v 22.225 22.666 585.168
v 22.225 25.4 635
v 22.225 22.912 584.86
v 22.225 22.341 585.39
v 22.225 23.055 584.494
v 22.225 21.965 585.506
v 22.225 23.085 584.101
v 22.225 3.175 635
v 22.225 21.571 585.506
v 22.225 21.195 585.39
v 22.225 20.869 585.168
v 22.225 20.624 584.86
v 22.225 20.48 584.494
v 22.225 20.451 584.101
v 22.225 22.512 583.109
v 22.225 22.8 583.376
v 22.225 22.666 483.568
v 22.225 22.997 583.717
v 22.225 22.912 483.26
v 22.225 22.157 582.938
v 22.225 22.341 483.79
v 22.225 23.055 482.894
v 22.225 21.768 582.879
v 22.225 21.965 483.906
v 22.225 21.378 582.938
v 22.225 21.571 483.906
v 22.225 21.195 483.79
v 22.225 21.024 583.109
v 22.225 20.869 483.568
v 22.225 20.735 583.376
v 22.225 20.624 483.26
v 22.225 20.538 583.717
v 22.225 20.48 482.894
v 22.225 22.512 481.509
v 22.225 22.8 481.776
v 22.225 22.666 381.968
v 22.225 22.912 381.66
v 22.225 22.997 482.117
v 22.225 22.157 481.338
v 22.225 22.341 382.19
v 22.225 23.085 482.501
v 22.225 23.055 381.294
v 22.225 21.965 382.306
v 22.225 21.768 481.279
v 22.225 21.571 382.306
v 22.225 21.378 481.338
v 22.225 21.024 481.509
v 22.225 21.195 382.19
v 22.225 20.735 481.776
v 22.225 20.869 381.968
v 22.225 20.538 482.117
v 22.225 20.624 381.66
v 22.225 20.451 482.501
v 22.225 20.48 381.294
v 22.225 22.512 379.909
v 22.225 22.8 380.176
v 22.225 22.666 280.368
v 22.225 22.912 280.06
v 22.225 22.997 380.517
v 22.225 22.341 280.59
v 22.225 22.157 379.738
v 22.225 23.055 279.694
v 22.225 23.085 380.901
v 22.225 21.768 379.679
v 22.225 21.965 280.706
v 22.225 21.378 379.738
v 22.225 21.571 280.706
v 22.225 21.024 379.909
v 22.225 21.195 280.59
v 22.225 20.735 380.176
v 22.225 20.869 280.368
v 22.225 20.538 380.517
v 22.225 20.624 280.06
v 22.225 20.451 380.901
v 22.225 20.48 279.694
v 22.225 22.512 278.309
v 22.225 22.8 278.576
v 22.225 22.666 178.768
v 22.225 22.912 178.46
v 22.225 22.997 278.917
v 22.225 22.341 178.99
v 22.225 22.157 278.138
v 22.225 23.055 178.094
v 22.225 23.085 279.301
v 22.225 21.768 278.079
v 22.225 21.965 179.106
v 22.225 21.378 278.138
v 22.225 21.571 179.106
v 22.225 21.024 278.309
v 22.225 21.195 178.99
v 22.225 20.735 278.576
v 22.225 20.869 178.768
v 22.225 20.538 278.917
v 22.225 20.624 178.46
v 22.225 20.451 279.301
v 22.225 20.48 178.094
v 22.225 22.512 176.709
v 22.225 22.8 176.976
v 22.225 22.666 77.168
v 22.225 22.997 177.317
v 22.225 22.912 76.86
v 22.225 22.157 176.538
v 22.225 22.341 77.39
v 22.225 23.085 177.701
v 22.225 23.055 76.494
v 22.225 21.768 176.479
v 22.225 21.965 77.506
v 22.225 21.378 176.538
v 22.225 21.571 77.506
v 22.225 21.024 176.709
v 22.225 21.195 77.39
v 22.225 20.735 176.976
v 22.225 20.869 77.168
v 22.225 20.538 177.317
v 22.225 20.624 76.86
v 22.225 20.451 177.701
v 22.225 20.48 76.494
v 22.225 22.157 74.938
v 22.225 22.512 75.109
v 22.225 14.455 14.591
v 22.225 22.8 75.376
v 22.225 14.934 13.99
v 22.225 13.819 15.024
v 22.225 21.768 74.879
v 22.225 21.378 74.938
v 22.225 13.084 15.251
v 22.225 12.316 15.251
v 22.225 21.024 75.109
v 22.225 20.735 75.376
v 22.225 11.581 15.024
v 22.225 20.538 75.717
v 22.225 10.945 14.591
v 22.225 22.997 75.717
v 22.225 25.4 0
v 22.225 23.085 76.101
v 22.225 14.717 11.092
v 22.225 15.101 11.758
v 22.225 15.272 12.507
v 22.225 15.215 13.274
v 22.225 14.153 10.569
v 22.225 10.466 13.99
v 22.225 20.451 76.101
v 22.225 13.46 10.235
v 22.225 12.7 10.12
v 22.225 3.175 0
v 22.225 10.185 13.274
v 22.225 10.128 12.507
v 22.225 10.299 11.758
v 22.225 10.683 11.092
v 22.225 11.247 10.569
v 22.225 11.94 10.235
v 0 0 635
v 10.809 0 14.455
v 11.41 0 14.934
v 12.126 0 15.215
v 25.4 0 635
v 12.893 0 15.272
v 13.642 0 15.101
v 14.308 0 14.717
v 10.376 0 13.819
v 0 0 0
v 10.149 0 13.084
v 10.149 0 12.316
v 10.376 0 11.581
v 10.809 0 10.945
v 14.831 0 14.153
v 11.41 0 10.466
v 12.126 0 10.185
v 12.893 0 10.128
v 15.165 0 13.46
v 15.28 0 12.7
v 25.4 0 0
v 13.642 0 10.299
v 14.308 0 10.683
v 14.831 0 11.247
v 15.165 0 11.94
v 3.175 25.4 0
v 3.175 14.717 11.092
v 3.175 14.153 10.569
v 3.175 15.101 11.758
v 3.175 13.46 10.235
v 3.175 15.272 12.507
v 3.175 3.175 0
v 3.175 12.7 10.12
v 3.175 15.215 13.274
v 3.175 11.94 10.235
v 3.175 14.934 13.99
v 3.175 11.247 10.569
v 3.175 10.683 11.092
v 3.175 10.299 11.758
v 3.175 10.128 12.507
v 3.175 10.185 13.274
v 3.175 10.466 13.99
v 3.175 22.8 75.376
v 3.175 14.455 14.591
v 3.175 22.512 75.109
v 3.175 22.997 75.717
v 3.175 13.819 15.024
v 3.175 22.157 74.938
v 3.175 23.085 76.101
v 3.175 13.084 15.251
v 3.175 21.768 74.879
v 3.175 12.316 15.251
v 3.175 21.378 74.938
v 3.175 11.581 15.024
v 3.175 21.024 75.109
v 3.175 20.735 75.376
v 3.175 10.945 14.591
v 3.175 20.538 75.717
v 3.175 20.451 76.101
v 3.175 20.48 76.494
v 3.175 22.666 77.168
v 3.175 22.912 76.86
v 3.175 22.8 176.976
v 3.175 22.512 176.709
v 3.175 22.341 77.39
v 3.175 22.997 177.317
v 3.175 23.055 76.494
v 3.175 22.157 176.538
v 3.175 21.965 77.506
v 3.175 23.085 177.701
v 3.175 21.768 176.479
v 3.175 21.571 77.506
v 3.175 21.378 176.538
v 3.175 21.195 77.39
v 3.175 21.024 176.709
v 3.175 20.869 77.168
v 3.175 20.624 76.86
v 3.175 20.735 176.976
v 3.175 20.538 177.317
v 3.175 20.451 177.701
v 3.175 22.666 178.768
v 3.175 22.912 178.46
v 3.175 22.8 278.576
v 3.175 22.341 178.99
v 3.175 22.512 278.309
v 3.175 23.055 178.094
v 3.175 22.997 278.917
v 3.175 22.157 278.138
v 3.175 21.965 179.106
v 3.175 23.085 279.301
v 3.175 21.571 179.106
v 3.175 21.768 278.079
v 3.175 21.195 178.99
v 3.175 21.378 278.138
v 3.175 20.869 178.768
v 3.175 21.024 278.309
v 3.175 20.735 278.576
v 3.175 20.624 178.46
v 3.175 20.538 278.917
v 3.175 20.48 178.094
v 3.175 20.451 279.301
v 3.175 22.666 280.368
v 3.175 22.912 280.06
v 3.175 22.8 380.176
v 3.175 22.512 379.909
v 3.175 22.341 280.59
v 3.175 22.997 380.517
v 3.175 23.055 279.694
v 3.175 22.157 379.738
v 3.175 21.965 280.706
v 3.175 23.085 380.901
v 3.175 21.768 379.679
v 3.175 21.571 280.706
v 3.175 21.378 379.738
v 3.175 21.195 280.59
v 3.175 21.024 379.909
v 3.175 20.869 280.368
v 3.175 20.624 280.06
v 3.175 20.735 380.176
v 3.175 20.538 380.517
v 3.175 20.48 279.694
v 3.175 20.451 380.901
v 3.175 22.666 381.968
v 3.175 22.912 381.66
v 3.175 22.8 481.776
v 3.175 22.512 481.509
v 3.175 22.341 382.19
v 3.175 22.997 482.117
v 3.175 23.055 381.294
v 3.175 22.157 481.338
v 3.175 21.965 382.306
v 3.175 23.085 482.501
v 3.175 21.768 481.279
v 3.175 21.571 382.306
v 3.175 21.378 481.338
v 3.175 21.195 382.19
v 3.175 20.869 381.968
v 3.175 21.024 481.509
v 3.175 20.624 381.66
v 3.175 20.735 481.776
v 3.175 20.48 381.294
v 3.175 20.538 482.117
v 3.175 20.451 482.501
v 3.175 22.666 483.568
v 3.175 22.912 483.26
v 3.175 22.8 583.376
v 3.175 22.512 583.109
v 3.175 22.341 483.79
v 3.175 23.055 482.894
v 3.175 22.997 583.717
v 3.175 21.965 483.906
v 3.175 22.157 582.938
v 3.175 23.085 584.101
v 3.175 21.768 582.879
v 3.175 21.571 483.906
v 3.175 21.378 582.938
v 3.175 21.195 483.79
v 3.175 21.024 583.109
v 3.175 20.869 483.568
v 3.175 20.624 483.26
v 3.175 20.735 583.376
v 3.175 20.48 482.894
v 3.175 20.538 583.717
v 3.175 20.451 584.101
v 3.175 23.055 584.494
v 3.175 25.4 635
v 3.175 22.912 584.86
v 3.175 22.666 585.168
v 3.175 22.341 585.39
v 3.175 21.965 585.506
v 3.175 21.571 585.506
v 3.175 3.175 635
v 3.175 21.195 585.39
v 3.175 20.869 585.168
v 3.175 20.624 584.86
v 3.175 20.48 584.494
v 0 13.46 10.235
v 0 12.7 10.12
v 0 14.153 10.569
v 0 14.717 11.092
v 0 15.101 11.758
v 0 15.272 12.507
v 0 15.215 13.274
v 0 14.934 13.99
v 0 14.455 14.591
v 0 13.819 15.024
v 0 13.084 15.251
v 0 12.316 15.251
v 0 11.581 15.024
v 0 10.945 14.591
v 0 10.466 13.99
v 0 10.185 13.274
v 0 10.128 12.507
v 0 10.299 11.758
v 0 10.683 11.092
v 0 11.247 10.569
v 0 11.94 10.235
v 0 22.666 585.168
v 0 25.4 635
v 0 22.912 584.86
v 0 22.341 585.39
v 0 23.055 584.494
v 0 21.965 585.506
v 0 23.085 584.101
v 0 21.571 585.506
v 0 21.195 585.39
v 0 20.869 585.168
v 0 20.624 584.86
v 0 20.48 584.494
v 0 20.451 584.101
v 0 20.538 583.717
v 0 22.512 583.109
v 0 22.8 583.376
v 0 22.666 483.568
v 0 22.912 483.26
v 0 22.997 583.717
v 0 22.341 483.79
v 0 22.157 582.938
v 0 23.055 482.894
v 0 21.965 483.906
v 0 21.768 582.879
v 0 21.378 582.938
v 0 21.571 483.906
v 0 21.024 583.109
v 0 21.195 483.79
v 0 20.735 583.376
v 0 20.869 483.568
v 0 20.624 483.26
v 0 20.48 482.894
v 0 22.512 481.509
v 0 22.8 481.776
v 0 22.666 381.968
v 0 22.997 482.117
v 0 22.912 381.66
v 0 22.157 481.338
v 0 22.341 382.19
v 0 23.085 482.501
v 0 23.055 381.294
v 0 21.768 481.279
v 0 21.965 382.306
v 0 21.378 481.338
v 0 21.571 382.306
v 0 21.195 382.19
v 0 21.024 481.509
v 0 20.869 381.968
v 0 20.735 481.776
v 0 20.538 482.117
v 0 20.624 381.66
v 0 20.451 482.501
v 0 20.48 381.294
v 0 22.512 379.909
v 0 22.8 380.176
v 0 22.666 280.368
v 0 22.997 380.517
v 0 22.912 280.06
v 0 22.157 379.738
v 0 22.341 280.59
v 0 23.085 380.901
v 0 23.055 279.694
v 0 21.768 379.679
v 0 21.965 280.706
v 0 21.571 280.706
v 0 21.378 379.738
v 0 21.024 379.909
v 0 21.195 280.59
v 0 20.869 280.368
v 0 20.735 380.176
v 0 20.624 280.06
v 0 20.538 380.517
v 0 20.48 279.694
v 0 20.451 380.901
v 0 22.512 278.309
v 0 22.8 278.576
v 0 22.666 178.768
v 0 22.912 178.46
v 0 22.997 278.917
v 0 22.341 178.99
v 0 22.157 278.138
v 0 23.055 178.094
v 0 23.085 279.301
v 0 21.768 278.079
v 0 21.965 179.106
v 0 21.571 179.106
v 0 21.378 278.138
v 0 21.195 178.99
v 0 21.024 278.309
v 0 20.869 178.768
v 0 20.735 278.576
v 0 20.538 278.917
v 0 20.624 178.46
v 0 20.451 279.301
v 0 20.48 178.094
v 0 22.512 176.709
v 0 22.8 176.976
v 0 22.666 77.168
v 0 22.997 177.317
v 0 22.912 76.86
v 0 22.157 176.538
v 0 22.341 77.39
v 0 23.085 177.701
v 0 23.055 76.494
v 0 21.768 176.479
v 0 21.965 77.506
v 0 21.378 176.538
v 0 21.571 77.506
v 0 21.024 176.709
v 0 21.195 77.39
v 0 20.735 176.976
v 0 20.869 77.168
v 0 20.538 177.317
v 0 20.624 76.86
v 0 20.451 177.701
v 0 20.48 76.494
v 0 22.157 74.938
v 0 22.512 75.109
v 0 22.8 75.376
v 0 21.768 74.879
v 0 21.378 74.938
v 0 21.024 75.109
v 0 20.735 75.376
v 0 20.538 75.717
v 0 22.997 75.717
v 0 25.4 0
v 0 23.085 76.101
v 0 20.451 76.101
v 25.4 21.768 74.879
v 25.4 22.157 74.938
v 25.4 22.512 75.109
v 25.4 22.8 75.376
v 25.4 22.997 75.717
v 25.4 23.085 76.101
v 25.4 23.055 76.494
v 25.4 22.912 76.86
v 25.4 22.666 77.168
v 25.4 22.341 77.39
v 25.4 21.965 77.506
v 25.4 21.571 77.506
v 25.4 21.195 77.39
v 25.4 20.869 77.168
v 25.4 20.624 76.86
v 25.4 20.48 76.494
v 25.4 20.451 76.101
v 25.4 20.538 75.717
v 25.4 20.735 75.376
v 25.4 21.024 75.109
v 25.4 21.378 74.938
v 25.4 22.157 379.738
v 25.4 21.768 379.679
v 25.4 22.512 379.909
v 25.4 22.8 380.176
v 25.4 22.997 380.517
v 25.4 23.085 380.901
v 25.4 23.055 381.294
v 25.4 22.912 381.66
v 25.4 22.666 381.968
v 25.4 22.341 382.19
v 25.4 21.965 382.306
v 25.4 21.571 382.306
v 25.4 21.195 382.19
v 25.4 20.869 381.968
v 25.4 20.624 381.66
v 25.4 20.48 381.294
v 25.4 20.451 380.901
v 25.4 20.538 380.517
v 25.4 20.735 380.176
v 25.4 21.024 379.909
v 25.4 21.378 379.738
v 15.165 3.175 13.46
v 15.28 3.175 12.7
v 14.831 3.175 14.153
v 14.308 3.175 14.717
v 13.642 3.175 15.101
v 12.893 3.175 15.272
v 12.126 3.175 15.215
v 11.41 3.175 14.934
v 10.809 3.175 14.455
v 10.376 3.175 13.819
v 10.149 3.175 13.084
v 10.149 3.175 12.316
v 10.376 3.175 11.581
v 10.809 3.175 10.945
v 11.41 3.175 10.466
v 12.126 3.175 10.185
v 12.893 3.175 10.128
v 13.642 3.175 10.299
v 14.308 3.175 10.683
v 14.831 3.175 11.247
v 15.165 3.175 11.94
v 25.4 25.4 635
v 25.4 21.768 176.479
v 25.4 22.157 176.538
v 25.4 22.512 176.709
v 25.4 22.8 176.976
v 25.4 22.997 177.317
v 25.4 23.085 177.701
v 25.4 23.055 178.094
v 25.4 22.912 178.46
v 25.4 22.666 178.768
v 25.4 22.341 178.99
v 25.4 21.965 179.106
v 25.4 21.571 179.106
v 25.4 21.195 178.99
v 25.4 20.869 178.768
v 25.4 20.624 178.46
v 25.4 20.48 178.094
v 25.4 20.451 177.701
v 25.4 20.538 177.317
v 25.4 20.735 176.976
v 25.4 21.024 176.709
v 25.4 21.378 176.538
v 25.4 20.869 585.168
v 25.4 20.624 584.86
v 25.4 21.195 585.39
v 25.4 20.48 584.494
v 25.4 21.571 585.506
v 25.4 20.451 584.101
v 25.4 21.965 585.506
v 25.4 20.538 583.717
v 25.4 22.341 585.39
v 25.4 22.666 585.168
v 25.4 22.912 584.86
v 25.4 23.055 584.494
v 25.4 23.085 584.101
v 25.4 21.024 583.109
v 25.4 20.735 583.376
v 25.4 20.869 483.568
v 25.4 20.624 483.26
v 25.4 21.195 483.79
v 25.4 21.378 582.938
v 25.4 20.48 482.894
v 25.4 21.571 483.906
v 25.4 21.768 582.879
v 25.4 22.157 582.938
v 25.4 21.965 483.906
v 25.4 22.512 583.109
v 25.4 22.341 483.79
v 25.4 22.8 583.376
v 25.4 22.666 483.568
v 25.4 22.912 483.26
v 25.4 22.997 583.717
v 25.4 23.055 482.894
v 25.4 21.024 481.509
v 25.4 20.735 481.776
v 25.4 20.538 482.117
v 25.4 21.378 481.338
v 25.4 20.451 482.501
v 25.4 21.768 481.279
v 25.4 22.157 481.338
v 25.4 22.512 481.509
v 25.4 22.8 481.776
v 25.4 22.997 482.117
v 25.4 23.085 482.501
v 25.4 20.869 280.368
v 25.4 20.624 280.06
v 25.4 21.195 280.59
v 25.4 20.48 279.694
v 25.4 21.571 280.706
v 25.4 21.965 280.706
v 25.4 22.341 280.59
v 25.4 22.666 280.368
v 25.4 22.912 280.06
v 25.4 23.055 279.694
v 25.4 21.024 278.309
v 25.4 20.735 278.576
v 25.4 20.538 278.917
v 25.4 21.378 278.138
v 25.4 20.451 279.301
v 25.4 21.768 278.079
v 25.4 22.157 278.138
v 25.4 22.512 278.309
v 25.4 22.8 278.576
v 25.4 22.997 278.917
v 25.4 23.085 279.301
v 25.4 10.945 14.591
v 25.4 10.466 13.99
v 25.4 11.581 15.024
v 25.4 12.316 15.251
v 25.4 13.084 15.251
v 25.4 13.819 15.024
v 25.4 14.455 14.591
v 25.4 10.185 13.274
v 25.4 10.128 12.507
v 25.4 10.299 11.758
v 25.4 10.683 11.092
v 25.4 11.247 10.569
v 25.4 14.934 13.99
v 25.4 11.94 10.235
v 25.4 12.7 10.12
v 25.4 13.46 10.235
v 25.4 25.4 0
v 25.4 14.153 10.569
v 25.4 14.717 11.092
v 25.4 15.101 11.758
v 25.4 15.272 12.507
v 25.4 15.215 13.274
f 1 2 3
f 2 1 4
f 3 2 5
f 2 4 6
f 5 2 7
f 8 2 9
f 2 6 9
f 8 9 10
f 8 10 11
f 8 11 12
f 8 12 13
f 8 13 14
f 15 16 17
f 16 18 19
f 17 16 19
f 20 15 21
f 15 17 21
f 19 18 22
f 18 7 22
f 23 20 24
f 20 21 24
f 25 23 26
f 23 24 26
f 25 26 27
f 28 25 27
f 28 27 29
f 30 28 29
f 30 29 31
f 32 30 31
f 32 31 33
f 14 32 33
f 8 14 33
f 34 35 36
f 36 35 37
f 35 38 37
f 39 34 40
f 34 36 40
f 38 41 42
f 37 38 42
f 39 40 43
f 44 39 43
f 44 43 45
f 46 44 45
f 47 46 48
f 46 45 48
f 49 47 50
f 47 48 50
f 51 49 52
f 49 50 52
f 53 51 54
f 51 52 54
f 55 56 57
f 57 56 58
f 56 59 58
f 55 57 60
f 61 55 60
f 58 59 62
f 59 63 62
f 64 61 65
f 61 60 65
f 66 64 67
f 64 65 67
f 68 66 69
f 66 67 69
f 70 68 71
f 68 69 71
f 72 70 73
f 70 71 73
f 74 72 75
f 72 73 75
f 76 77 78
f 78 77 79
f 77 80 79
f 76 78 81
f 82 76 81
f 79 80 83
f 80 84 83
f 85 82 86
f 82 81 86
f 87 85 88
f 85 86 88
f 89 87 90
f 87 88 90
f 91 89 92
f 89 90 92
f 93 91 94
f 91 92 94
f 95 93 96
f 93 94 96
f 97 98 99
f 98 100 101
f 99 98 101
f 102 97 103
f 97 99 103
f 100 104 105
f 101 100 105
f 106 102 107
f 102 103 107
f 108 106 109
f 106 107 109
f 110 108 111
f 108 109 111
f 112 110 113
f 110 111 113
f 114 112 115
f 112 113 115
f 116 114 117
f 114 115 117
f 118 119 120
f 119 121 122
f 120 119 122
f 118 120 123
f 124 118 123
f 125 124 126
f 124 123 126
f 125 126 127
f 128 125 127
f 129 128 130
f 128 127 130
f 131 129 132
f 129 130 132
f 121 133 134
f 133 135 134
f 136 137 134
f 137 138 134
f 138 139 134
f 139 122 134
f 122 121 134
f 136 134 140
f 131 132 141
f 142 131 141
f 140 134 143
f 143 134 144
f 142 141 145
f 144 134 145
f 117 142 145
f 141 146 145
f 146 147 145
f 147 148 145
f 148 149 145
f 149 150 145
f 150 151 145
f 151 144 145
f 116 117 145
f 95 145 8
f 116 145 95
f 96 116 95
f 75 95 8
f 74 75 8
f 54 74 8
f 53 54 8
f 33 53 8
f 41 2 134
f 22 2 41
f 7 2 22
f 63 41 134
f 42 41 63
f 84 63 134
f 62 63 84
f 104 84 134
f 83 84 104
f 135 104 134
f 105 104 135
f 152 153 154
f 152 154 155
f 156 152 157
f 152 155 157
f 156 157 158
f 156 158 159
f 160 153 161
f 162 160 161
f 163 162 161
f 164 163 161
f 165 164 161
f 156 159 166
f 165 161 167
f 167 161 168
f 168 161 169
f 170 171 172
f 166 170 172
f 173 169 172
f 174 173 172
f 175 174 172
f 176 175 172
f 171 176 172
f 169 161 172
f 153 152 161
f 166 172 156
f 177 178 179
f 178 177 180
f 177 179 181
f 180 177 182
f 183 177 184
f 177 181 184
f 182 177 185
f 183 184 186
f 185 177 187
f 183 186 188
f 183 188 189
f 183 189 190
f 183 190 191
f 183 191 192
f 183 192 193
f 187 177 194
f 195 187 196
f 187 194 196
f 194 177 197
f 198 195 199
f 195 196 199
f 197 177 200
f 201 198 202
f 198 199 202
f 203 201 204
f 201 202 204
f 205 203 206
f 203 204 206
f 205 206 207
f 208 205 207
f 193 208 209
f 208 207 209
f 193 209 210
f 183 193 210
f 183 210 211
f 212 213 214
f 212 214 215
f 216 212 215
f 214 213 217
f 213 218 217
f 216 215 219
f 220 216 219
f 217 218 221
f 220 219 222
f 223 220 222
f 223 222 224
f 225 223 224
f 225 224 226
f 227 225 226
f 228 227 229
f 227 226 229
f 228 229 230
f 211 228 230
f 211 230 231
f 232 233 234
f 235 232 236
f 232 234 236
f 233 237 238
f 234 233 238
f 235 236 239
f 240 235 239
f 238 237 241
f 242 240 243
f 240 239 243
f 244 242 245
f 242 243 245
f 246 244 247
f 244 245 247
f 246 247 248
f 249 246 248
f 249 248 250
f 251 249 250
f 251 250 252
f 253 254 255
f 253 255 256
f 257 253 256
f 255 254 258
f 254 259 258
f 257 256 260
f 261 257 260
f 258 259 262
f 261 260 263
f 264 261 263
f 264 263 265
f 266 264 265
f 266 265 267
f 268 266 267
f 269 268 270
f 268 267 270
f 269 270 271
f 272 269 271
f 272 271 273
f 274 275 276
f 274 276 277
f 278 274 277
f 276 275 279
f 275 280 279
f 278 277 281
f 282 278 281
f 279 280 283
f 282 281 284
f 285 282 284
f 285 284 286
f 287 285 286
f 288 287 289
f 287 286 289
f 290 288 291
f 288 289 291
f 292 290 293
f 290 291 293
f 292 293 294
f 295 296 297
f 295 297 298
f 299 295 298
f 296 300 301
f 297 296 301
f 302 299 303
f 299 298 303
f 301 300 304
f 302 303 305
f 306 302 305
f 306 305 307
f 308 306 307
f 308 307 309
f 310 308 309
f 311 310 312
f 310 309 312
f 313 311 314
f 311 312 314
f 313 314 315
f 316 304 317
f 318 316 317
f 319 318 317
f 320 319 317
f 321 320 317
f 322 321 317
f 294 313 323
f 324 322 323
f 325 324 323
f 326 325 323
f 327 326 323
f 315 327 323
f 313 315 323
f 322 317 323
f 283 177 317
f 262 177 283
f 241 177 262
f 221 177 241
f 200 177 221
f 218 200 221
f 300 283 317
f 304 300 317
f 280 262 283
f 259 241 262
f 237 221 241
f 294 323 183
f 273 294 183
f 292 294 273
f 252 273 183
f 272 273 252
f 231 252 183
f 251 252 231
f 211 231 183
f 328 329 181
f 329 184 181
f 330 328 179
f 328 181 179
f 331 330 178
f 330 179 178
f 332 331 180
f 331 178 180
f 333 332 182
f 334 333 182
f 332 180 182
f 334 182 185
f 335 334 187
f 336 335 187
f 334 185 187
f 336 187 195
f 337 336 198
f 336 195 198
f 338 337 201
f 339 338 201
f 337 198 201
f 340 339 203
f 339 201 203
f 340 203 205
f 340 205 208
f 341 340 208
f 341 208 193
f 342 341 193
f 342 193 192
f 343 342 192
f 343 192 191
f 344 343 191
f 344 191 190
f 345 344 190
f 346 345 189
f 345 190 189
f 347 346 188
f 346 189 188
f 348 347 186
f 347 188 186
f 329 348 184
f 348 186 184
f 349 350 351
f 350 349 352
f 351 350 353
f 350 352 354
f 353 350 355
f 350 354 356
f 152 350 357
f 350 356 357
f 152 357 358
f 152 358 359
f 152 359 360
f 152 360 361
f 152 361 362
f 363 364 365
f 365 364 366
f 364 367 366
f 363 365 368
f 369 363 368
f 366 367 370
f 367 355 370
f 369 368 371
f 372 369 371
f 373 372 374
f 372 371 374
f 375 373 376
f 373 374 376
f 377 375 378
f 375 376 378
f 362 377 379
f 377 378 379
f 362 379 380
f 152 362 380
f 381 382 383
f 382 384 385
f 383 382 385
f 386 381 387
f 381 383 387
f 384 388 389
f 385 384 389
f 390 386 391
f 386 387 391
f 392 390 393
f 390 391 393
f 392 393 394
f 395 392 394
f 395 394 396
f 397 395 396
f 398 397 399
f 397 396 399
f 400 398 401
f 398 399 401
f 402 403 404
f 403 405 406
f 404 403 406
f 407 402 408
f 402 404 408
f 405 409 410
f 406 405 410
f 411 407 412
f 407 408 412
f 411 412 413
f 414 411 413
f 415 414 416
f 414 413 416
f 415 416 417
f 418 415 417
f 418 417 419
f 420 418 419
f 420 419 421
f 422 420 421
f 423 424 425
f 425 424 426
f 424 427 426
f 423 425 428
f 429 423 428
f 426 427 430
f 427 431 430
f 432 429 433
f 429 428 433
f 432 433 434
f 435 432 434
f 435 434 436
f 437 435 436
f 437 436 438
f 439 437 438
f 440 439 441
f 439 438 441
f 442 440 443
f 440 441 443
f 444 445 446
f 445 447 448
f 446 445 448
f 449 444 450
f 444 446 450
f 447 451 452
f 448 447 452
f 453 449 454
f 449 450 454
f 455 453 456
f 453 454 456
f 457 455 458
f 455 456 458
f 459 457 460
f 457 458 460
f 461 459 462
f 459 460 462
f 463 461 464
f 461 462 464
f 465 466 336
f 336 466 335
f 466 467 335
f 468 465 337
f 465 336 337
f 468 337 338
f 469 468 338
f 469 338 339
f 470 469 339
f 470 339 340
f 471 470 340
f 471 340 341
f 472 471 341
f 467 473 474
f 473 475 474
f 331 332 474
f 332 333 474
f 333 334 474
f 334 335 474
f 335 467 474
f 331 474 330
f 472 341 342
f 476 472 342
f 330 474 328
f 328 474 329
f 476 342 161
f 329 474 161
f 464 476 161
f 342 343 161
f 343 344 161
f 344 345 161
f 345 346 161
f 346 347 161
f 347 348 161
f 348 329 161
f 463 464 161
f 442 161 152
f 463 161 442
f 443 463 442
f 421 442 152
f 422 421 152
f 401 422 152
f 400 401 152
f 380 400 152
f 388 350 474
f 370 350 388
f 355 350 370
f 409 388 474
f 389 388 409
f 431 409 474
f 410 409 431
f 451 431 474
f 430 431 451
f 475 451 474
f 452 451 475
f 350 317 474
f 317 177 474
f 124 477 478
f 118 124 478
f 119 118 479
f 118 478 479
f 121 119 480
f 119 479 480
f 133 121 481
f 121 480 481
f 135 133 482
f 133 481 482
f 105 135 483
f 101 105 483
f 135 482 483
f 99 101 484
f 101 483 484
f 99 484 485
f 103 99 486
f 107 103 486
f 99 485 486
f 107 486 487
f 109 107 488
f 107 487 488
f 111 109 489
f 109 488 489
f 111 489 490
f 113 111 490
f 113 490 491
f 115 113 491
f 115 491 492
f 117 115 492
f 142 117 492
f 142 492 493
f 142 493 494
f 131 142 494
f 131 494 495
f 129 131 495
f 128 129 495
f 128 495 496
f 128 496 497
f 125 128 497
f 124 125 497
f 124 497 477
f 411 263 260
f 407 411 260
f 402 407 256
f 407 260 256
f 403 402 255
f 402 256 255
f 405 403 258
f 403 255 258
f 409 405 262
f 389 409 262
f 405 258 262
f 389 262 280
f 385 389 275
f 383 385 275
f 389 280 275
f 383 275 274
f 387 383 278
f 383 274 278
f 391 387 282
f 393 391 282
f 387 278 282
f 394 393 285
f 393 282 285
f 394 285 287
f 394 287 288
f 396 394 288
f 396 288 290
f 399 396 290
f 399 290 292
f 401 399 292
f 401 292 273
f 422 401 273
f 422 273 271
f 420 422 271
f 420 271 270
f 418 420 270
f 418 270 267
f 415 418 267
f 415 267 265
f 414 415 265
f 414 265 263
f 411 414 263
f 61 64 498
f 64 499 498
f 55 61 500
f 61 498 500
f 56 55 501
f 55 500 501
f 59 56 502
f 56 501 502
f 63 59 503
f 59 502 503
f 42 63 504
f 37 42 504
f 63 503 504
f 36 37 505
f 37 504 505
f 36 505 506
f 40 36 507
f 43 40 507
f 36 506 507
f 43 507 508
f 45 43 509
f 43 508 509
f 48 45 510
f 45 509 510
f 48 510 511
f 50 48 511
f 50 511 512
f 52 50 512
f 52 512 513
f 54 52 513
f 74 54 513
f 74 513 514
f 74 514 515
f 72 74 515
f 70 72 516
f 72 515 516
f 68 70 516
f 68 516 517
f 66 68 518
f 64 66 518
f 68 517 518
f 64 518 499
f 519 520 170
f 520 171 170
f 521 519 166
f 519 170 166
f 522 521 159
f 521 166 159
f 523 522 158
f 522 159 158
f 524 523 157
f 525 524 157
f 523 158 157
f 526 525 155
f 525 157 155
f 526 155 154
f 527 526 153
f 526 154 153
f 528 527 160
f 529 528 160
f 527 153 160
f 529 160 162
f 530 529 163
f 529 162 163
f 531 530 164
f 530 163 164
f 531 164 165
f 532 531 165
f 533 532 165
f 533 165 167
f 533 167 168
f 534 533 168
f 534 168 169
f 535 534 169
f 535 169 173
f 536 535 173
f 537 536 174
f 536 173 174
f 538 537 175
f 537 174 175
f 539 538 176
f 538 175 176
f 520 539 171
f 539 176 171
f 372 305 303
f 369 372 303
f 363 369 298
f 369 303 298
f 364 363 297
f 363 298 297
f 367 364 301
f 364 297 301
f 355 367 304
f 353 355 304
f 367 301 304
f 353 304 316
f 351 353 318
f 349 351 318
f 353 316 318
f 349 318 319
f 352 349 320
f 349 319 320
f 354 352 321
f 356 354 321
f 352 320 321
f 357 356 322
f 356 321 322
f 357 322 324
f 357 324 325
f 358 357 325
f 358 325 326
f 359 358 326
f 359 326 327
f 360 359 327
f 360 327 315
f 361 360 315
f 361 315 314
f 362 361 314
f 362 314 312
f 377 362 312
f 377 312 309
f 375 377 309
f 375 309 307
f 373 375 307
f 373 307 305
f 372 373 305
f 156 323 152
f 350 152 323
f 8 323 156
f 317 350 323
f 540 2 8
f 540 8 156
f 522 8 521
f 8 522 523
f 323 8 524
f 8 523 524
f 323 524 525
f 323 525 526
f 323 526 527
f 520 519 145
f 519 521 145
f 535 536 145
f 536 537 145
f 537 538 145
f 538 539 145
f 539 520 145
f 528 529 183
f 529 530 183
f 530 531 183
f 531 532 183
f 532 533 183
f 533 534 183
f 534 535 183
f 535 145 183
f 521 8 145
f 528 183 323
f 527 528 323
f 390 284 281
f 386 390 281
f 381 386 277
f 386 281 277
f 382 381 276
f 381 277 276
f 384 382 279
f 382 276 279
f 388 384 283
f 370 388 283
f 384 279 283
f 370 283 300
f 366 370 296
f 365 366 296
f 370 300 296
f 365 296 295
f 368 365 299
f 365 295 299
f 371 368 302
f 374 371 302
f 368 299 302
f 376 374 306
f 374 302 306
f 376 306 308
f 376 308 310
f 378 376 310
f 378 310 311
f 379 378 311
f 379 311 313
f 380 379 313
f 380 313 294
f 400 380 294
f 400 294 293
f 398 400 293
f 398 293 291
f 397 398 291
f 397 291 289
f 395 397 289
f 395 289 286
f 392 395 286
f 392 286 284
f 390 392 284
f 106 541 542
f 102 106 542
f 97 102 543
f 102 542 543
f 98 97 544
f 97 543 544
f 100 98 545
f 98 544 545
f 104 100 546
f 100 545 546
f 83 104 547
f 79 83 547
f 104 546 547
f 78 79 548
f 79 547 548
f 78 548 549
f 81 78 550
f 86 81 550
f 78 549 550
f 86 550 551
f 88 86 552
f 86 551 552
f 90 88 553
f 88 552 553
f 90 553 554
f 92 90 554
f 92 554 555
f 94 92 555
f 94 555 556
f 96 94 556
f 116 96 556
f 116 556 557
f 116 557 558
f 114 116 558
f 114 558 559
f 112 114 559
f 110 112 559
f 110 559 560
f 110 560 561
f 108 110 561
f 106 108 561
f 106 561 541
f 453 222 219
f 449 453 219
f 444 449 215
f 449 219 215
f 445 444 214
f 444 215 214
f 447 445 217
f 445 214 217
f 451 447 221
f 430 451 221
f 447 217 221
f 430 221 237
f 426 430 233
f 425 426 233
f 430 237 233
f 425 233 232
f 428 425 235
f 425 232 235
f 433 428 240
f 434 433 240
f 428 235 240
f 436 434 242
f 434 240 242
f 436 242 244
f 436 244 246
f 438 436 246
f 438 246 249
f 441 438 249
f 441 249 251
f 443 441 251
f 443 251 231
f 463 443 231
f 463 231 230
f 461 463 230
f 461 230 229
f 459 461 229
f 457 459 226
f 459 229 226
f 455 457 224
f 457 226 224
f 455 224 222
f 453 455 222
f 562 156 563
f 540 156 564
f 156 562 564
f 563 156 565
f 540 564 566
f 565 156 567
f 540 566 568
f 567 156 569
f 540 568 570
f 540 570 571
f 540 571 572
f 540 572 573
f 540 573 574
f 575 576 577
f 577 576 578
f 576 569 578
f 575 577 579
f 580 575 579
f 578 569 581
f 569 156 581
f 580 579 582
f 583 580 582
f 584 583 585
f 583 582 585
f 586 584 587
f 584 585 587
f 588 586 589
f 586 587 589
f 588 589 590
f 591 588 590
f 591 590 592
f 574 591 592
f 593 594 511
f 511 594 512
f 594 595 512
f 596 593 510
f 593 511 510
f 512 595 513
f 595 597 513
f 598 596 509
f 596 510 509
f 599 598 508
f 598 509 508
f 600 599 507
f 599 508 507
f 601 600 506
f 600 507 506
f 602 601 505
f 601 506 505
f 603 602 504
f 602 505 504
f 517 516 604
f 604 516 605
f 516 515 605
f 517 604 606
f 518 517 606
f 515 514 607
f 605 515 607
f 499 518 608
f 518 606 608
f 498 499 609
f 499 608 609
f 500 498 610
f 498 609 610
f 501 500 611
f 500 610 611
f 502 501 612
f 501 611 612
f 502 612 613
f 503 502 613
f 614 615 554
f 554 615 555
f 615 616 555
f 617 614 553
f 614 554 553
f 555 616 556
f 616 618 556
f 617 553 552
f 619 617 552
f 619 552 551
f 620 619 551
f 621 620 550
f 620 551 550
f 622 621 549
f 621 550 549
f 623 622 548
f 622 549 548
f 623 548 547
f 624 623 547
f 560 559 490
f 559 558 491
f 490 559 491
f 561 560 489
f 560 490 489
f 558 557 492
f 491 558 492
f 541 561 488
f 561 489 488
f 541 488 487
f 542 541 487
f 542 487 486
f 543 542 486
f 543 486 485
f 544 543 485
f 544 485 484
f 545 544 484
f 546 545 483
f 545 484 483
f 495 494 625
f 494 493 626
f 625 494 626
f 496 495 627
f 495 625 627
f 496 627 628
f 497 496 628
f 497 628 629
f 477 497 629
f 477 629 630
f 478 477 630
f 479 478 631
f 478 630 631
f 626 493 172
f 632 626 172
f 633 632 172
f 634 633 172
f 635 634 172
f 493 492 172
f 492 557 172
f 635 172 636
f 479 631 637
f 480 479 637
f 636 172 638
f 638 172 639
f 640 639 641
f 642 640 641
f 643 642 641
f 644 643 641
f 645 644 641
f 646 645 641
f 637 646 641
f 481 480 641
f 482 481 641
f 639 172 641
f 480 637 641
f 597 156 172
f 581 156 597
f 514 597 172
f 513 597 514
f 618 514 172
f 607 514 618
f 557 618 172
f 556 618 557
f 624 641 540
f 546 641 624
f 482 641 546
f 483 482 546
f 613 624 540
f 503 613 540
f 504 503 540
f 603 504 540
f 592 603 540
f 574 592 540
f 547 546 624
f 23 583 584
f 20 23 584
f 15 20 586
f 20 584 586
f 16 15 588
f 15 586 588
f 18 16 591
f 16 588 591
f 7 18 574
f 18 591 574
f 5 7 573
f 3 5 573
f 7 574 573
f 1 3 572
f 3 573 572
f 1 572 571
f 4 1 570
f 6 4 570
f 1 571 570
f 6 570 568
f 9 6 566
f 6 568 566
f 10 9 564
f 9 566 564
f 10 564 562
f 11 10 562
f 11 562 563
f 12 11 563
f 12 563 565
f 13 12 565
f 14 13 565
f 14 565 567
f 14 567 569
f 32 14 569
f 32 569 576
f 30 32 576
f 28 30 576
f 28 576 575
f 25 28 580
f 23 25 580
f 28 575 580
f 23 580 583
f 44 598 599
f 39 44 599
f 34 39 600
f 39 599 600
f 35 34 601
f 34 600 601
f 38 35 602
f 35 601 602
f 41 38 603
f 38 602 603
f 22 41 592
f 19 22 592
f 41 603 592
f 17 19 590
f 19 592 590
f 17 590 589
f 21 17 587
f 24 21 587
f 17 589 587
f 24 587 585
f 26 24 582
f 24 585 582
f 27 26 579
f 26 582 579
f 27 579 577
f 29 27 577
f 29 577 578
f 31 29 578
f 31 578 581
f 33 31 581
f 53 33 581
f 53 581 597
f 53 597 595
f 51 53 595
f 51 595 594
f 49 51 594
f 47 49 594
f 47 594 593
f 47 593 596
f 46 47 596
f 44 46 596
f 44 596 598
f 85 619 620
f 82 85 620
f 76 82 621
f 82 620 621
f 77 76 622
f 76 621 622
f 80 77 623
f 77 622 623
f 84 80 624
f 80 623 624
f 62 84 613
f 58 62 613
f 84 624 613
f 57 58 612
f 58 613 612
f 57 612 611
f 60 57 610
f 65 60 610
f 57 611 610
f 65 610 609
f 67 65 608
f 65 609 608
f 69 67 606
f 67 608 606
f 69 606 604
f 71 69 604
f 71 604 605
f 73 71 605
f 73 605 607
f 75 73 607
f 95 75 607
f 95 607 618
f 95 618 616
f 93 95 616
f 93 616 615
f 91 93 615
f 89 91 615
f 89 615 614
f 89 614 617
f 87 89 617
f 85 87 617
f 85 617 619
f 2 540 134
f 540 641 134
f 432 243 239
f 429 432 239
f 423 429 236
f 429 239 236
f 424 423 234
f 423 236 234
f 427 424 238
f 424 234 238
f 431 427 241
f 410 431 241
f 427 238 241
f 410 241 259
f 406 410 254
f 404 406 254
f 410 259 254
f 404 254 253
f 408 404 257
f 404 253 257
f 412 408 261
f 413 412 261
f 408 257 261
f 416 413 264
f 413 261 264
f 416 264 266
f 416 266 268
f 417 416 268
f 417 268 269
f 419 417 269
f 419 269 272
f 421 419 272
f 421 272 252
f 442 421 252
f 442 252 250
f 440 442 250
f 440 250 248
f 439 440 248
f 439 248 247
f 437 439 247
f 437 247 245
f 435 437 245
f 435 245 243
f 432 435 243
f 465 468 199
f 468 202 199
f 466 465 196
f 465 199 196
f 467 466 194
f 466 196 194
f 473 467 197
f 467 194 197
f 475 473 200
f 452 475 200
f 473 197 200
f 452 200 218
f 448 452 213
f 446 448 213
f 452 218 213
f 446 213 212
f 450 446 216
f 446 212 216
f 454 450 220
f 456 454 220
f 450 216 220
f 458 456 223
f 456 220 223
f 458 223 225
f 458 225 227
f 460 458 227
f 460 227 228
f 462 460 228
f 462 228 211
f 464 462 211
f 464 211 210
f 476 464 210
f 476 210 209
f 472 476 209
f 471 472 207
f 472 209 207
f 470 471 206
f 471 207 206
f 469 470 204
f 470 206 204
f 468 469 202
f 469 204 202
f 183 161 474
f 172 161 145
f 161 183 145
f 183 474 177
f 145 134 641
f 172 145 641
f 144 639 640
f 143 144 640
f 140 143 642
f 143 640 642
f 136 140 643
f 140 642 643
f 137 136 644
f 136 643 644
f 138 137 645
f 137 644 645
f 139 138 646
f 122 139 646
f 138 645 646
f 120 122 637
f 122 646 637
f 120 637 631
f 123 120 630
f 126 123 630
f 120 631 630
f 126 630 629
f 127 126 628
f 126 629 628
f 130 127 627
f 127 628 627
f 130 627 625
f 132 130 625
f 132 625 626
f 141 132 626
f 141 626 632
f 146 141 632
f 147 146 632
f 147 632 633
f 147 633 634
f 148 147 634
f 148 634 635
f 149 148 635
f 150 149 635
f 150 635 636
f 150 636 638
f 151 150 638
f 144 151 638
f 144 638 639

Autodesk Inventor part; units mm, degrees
ref_plane "YZ Plane" through (0, 0, 0) normal (1, 0, 0) x (0, 1, 0)
ref_plane "XZ Plane" through (0, 0, 0) normal (0, 1, 0) x (-1, 0, 0)
ref_plane "XY Plane" through (0, 0, 0) normal (0, 0, 1) x (1, 0, 0)
sketch "Sketch1" plane through (0, 0, 0) normal (0, 0, 1) x (1, 0, 0)
  line L0 (0, 0) -> (25.4, 0)
  line L1 (25.4, 0) -> (25.4, 25.4)
  line L2 (25.4, 25.4) -> (0, 25.4)
  line L3 (0, 25.4) -> (0, 0)
  line L4 (3.175, 22.225) -> (22.225, 22.225)
  line L5 (22.225, 22.225) -> (22.225, 3.175)
  line L6 (22.225, 3.175) -> (3.175, 3.175)
  line L7 (3.175, 3.175) -> (3.175, 22.225)
  dimension "d0" = 25.4
  dimension "d1" = 25.4
  dimension "d2" = 3.175
extrude "Extrusion1" add sketch "Sketch1" along normal blind 635
sketch "Sketch2" plane through (25.4, 0, 0) normal (1, 0, 0) x (0, 0, -1)
  line L0 (0, 0) -> (0, 25.4) construction
  line L1 (0, 25.4) -> (0, 18.7198) construction
  line L2 (0, 25.4) -> (0, 21.7678) construction
  line L3 (0, 22.225) -> (-635, 22.225) construction
  line L4 (0, 21.7678) -> (-76.2, 21.7678) construction
  line L5 (-76.2, 21.7678) -> (-177.8, 21.7678) construction
  line L6 (-177.8, 21.7678) -> (-279.4, 21.7678) construction
  line L7 (-279.4, 21.7678) -> (-381, 21.7678) construction
  line L8 (-381, 21.7678) -> (-482.6, 21.7678) construction
  line L9 (-482.6, 21.7678) -> (-584.2, 21.7678) construction
  circle A0 centre (-76.2, 21.7678) radius 1.3208
  circle A1 centre (-177.8, 21.7678) radius 1.3208
  circle A2 centre (-279.4, 21.7678) radius 1.3208
  circle A3 centre (-381, 21.7678) radius 1.3208
  circle A4 centre (-482.6, 21.7678) radius 1.3208
  circle A5 centre (-584.2, 21.7678) radius 1.3208
  dimension "d5" = 6.6802
  dimension "d6" = 3.6322
  dimension "d8" = 76.2
  dimension "d9" = 101.6
  dimension "d11" = 101.6
  dimension "d12" = 101.6
  dimension "d13" = 101.6
  dimension "d14" = 101.6
  dimension "d15" = 2.6416
extrude "Extrusion2" cut sketch "Sketch2" against normal blind 635
sketch "Sketch3" plane through (0, 0, 635) normal (0, 0, 1) x (1, 0, 0)
  line L0 (3.175, 3.175) -> (3.175, 22.225) projected
  line L1 (3.175, 22.225) -> (22.225, 22.225)
  line L2 (22.225, 22.225) -> (22.225, 42.4073)
  line L3 (22.225, 42.4073) -> (3.175, 42.4073)
  line L4 (3.175, 42.4073) -> (3.175, 22.225)
  point P0 (0, 0)
  dimension "d18" = 19.05
extrude "Extrusion3" cut sketch "Sketch3" against normal blind 635
sketch "Sketch4" plane through (25.4, 0, 0) normal (1, 0, 0) x (0, 0, -1)
  line L0 (0, 25.4) -> (0, 0) projected
  line L1 (0, 12.7) -> (-12.7, 12.7) construction
  line L2 (0, 12.7) -> (12.7, 12.7) construction
  circle A0 centre (-12.7, 12.7) radius 2.5797
  dimension "d21" = 12.7
  dimension "d22" = 180
  dimension "d23" = 5.1594
extrude "Extrusion4" cut sketch "Sketch4" against normal blind 635
sketch "Sketch5" plane through (0, 0, 0) normal (0, -1, 0) x (1, 0, 0)
  line L0 (0, 0) -> (25.4, 0) construction
  line L1 (12.7, 0) -> (12.7, 12.7) construction
  line L2 (12.7, 0) -> (25.4, 0) construction
  circle A0 centre (12.7, 12.7) radius 2.5797
  dimension "d26" = 12.7
  dimension "d27" = 90
  dimension "d28" = 5.1594
extrude "Extrusion6" cut sketch "Sketch5" against normal blind 635
properties part number "1x1 U-Channel"
